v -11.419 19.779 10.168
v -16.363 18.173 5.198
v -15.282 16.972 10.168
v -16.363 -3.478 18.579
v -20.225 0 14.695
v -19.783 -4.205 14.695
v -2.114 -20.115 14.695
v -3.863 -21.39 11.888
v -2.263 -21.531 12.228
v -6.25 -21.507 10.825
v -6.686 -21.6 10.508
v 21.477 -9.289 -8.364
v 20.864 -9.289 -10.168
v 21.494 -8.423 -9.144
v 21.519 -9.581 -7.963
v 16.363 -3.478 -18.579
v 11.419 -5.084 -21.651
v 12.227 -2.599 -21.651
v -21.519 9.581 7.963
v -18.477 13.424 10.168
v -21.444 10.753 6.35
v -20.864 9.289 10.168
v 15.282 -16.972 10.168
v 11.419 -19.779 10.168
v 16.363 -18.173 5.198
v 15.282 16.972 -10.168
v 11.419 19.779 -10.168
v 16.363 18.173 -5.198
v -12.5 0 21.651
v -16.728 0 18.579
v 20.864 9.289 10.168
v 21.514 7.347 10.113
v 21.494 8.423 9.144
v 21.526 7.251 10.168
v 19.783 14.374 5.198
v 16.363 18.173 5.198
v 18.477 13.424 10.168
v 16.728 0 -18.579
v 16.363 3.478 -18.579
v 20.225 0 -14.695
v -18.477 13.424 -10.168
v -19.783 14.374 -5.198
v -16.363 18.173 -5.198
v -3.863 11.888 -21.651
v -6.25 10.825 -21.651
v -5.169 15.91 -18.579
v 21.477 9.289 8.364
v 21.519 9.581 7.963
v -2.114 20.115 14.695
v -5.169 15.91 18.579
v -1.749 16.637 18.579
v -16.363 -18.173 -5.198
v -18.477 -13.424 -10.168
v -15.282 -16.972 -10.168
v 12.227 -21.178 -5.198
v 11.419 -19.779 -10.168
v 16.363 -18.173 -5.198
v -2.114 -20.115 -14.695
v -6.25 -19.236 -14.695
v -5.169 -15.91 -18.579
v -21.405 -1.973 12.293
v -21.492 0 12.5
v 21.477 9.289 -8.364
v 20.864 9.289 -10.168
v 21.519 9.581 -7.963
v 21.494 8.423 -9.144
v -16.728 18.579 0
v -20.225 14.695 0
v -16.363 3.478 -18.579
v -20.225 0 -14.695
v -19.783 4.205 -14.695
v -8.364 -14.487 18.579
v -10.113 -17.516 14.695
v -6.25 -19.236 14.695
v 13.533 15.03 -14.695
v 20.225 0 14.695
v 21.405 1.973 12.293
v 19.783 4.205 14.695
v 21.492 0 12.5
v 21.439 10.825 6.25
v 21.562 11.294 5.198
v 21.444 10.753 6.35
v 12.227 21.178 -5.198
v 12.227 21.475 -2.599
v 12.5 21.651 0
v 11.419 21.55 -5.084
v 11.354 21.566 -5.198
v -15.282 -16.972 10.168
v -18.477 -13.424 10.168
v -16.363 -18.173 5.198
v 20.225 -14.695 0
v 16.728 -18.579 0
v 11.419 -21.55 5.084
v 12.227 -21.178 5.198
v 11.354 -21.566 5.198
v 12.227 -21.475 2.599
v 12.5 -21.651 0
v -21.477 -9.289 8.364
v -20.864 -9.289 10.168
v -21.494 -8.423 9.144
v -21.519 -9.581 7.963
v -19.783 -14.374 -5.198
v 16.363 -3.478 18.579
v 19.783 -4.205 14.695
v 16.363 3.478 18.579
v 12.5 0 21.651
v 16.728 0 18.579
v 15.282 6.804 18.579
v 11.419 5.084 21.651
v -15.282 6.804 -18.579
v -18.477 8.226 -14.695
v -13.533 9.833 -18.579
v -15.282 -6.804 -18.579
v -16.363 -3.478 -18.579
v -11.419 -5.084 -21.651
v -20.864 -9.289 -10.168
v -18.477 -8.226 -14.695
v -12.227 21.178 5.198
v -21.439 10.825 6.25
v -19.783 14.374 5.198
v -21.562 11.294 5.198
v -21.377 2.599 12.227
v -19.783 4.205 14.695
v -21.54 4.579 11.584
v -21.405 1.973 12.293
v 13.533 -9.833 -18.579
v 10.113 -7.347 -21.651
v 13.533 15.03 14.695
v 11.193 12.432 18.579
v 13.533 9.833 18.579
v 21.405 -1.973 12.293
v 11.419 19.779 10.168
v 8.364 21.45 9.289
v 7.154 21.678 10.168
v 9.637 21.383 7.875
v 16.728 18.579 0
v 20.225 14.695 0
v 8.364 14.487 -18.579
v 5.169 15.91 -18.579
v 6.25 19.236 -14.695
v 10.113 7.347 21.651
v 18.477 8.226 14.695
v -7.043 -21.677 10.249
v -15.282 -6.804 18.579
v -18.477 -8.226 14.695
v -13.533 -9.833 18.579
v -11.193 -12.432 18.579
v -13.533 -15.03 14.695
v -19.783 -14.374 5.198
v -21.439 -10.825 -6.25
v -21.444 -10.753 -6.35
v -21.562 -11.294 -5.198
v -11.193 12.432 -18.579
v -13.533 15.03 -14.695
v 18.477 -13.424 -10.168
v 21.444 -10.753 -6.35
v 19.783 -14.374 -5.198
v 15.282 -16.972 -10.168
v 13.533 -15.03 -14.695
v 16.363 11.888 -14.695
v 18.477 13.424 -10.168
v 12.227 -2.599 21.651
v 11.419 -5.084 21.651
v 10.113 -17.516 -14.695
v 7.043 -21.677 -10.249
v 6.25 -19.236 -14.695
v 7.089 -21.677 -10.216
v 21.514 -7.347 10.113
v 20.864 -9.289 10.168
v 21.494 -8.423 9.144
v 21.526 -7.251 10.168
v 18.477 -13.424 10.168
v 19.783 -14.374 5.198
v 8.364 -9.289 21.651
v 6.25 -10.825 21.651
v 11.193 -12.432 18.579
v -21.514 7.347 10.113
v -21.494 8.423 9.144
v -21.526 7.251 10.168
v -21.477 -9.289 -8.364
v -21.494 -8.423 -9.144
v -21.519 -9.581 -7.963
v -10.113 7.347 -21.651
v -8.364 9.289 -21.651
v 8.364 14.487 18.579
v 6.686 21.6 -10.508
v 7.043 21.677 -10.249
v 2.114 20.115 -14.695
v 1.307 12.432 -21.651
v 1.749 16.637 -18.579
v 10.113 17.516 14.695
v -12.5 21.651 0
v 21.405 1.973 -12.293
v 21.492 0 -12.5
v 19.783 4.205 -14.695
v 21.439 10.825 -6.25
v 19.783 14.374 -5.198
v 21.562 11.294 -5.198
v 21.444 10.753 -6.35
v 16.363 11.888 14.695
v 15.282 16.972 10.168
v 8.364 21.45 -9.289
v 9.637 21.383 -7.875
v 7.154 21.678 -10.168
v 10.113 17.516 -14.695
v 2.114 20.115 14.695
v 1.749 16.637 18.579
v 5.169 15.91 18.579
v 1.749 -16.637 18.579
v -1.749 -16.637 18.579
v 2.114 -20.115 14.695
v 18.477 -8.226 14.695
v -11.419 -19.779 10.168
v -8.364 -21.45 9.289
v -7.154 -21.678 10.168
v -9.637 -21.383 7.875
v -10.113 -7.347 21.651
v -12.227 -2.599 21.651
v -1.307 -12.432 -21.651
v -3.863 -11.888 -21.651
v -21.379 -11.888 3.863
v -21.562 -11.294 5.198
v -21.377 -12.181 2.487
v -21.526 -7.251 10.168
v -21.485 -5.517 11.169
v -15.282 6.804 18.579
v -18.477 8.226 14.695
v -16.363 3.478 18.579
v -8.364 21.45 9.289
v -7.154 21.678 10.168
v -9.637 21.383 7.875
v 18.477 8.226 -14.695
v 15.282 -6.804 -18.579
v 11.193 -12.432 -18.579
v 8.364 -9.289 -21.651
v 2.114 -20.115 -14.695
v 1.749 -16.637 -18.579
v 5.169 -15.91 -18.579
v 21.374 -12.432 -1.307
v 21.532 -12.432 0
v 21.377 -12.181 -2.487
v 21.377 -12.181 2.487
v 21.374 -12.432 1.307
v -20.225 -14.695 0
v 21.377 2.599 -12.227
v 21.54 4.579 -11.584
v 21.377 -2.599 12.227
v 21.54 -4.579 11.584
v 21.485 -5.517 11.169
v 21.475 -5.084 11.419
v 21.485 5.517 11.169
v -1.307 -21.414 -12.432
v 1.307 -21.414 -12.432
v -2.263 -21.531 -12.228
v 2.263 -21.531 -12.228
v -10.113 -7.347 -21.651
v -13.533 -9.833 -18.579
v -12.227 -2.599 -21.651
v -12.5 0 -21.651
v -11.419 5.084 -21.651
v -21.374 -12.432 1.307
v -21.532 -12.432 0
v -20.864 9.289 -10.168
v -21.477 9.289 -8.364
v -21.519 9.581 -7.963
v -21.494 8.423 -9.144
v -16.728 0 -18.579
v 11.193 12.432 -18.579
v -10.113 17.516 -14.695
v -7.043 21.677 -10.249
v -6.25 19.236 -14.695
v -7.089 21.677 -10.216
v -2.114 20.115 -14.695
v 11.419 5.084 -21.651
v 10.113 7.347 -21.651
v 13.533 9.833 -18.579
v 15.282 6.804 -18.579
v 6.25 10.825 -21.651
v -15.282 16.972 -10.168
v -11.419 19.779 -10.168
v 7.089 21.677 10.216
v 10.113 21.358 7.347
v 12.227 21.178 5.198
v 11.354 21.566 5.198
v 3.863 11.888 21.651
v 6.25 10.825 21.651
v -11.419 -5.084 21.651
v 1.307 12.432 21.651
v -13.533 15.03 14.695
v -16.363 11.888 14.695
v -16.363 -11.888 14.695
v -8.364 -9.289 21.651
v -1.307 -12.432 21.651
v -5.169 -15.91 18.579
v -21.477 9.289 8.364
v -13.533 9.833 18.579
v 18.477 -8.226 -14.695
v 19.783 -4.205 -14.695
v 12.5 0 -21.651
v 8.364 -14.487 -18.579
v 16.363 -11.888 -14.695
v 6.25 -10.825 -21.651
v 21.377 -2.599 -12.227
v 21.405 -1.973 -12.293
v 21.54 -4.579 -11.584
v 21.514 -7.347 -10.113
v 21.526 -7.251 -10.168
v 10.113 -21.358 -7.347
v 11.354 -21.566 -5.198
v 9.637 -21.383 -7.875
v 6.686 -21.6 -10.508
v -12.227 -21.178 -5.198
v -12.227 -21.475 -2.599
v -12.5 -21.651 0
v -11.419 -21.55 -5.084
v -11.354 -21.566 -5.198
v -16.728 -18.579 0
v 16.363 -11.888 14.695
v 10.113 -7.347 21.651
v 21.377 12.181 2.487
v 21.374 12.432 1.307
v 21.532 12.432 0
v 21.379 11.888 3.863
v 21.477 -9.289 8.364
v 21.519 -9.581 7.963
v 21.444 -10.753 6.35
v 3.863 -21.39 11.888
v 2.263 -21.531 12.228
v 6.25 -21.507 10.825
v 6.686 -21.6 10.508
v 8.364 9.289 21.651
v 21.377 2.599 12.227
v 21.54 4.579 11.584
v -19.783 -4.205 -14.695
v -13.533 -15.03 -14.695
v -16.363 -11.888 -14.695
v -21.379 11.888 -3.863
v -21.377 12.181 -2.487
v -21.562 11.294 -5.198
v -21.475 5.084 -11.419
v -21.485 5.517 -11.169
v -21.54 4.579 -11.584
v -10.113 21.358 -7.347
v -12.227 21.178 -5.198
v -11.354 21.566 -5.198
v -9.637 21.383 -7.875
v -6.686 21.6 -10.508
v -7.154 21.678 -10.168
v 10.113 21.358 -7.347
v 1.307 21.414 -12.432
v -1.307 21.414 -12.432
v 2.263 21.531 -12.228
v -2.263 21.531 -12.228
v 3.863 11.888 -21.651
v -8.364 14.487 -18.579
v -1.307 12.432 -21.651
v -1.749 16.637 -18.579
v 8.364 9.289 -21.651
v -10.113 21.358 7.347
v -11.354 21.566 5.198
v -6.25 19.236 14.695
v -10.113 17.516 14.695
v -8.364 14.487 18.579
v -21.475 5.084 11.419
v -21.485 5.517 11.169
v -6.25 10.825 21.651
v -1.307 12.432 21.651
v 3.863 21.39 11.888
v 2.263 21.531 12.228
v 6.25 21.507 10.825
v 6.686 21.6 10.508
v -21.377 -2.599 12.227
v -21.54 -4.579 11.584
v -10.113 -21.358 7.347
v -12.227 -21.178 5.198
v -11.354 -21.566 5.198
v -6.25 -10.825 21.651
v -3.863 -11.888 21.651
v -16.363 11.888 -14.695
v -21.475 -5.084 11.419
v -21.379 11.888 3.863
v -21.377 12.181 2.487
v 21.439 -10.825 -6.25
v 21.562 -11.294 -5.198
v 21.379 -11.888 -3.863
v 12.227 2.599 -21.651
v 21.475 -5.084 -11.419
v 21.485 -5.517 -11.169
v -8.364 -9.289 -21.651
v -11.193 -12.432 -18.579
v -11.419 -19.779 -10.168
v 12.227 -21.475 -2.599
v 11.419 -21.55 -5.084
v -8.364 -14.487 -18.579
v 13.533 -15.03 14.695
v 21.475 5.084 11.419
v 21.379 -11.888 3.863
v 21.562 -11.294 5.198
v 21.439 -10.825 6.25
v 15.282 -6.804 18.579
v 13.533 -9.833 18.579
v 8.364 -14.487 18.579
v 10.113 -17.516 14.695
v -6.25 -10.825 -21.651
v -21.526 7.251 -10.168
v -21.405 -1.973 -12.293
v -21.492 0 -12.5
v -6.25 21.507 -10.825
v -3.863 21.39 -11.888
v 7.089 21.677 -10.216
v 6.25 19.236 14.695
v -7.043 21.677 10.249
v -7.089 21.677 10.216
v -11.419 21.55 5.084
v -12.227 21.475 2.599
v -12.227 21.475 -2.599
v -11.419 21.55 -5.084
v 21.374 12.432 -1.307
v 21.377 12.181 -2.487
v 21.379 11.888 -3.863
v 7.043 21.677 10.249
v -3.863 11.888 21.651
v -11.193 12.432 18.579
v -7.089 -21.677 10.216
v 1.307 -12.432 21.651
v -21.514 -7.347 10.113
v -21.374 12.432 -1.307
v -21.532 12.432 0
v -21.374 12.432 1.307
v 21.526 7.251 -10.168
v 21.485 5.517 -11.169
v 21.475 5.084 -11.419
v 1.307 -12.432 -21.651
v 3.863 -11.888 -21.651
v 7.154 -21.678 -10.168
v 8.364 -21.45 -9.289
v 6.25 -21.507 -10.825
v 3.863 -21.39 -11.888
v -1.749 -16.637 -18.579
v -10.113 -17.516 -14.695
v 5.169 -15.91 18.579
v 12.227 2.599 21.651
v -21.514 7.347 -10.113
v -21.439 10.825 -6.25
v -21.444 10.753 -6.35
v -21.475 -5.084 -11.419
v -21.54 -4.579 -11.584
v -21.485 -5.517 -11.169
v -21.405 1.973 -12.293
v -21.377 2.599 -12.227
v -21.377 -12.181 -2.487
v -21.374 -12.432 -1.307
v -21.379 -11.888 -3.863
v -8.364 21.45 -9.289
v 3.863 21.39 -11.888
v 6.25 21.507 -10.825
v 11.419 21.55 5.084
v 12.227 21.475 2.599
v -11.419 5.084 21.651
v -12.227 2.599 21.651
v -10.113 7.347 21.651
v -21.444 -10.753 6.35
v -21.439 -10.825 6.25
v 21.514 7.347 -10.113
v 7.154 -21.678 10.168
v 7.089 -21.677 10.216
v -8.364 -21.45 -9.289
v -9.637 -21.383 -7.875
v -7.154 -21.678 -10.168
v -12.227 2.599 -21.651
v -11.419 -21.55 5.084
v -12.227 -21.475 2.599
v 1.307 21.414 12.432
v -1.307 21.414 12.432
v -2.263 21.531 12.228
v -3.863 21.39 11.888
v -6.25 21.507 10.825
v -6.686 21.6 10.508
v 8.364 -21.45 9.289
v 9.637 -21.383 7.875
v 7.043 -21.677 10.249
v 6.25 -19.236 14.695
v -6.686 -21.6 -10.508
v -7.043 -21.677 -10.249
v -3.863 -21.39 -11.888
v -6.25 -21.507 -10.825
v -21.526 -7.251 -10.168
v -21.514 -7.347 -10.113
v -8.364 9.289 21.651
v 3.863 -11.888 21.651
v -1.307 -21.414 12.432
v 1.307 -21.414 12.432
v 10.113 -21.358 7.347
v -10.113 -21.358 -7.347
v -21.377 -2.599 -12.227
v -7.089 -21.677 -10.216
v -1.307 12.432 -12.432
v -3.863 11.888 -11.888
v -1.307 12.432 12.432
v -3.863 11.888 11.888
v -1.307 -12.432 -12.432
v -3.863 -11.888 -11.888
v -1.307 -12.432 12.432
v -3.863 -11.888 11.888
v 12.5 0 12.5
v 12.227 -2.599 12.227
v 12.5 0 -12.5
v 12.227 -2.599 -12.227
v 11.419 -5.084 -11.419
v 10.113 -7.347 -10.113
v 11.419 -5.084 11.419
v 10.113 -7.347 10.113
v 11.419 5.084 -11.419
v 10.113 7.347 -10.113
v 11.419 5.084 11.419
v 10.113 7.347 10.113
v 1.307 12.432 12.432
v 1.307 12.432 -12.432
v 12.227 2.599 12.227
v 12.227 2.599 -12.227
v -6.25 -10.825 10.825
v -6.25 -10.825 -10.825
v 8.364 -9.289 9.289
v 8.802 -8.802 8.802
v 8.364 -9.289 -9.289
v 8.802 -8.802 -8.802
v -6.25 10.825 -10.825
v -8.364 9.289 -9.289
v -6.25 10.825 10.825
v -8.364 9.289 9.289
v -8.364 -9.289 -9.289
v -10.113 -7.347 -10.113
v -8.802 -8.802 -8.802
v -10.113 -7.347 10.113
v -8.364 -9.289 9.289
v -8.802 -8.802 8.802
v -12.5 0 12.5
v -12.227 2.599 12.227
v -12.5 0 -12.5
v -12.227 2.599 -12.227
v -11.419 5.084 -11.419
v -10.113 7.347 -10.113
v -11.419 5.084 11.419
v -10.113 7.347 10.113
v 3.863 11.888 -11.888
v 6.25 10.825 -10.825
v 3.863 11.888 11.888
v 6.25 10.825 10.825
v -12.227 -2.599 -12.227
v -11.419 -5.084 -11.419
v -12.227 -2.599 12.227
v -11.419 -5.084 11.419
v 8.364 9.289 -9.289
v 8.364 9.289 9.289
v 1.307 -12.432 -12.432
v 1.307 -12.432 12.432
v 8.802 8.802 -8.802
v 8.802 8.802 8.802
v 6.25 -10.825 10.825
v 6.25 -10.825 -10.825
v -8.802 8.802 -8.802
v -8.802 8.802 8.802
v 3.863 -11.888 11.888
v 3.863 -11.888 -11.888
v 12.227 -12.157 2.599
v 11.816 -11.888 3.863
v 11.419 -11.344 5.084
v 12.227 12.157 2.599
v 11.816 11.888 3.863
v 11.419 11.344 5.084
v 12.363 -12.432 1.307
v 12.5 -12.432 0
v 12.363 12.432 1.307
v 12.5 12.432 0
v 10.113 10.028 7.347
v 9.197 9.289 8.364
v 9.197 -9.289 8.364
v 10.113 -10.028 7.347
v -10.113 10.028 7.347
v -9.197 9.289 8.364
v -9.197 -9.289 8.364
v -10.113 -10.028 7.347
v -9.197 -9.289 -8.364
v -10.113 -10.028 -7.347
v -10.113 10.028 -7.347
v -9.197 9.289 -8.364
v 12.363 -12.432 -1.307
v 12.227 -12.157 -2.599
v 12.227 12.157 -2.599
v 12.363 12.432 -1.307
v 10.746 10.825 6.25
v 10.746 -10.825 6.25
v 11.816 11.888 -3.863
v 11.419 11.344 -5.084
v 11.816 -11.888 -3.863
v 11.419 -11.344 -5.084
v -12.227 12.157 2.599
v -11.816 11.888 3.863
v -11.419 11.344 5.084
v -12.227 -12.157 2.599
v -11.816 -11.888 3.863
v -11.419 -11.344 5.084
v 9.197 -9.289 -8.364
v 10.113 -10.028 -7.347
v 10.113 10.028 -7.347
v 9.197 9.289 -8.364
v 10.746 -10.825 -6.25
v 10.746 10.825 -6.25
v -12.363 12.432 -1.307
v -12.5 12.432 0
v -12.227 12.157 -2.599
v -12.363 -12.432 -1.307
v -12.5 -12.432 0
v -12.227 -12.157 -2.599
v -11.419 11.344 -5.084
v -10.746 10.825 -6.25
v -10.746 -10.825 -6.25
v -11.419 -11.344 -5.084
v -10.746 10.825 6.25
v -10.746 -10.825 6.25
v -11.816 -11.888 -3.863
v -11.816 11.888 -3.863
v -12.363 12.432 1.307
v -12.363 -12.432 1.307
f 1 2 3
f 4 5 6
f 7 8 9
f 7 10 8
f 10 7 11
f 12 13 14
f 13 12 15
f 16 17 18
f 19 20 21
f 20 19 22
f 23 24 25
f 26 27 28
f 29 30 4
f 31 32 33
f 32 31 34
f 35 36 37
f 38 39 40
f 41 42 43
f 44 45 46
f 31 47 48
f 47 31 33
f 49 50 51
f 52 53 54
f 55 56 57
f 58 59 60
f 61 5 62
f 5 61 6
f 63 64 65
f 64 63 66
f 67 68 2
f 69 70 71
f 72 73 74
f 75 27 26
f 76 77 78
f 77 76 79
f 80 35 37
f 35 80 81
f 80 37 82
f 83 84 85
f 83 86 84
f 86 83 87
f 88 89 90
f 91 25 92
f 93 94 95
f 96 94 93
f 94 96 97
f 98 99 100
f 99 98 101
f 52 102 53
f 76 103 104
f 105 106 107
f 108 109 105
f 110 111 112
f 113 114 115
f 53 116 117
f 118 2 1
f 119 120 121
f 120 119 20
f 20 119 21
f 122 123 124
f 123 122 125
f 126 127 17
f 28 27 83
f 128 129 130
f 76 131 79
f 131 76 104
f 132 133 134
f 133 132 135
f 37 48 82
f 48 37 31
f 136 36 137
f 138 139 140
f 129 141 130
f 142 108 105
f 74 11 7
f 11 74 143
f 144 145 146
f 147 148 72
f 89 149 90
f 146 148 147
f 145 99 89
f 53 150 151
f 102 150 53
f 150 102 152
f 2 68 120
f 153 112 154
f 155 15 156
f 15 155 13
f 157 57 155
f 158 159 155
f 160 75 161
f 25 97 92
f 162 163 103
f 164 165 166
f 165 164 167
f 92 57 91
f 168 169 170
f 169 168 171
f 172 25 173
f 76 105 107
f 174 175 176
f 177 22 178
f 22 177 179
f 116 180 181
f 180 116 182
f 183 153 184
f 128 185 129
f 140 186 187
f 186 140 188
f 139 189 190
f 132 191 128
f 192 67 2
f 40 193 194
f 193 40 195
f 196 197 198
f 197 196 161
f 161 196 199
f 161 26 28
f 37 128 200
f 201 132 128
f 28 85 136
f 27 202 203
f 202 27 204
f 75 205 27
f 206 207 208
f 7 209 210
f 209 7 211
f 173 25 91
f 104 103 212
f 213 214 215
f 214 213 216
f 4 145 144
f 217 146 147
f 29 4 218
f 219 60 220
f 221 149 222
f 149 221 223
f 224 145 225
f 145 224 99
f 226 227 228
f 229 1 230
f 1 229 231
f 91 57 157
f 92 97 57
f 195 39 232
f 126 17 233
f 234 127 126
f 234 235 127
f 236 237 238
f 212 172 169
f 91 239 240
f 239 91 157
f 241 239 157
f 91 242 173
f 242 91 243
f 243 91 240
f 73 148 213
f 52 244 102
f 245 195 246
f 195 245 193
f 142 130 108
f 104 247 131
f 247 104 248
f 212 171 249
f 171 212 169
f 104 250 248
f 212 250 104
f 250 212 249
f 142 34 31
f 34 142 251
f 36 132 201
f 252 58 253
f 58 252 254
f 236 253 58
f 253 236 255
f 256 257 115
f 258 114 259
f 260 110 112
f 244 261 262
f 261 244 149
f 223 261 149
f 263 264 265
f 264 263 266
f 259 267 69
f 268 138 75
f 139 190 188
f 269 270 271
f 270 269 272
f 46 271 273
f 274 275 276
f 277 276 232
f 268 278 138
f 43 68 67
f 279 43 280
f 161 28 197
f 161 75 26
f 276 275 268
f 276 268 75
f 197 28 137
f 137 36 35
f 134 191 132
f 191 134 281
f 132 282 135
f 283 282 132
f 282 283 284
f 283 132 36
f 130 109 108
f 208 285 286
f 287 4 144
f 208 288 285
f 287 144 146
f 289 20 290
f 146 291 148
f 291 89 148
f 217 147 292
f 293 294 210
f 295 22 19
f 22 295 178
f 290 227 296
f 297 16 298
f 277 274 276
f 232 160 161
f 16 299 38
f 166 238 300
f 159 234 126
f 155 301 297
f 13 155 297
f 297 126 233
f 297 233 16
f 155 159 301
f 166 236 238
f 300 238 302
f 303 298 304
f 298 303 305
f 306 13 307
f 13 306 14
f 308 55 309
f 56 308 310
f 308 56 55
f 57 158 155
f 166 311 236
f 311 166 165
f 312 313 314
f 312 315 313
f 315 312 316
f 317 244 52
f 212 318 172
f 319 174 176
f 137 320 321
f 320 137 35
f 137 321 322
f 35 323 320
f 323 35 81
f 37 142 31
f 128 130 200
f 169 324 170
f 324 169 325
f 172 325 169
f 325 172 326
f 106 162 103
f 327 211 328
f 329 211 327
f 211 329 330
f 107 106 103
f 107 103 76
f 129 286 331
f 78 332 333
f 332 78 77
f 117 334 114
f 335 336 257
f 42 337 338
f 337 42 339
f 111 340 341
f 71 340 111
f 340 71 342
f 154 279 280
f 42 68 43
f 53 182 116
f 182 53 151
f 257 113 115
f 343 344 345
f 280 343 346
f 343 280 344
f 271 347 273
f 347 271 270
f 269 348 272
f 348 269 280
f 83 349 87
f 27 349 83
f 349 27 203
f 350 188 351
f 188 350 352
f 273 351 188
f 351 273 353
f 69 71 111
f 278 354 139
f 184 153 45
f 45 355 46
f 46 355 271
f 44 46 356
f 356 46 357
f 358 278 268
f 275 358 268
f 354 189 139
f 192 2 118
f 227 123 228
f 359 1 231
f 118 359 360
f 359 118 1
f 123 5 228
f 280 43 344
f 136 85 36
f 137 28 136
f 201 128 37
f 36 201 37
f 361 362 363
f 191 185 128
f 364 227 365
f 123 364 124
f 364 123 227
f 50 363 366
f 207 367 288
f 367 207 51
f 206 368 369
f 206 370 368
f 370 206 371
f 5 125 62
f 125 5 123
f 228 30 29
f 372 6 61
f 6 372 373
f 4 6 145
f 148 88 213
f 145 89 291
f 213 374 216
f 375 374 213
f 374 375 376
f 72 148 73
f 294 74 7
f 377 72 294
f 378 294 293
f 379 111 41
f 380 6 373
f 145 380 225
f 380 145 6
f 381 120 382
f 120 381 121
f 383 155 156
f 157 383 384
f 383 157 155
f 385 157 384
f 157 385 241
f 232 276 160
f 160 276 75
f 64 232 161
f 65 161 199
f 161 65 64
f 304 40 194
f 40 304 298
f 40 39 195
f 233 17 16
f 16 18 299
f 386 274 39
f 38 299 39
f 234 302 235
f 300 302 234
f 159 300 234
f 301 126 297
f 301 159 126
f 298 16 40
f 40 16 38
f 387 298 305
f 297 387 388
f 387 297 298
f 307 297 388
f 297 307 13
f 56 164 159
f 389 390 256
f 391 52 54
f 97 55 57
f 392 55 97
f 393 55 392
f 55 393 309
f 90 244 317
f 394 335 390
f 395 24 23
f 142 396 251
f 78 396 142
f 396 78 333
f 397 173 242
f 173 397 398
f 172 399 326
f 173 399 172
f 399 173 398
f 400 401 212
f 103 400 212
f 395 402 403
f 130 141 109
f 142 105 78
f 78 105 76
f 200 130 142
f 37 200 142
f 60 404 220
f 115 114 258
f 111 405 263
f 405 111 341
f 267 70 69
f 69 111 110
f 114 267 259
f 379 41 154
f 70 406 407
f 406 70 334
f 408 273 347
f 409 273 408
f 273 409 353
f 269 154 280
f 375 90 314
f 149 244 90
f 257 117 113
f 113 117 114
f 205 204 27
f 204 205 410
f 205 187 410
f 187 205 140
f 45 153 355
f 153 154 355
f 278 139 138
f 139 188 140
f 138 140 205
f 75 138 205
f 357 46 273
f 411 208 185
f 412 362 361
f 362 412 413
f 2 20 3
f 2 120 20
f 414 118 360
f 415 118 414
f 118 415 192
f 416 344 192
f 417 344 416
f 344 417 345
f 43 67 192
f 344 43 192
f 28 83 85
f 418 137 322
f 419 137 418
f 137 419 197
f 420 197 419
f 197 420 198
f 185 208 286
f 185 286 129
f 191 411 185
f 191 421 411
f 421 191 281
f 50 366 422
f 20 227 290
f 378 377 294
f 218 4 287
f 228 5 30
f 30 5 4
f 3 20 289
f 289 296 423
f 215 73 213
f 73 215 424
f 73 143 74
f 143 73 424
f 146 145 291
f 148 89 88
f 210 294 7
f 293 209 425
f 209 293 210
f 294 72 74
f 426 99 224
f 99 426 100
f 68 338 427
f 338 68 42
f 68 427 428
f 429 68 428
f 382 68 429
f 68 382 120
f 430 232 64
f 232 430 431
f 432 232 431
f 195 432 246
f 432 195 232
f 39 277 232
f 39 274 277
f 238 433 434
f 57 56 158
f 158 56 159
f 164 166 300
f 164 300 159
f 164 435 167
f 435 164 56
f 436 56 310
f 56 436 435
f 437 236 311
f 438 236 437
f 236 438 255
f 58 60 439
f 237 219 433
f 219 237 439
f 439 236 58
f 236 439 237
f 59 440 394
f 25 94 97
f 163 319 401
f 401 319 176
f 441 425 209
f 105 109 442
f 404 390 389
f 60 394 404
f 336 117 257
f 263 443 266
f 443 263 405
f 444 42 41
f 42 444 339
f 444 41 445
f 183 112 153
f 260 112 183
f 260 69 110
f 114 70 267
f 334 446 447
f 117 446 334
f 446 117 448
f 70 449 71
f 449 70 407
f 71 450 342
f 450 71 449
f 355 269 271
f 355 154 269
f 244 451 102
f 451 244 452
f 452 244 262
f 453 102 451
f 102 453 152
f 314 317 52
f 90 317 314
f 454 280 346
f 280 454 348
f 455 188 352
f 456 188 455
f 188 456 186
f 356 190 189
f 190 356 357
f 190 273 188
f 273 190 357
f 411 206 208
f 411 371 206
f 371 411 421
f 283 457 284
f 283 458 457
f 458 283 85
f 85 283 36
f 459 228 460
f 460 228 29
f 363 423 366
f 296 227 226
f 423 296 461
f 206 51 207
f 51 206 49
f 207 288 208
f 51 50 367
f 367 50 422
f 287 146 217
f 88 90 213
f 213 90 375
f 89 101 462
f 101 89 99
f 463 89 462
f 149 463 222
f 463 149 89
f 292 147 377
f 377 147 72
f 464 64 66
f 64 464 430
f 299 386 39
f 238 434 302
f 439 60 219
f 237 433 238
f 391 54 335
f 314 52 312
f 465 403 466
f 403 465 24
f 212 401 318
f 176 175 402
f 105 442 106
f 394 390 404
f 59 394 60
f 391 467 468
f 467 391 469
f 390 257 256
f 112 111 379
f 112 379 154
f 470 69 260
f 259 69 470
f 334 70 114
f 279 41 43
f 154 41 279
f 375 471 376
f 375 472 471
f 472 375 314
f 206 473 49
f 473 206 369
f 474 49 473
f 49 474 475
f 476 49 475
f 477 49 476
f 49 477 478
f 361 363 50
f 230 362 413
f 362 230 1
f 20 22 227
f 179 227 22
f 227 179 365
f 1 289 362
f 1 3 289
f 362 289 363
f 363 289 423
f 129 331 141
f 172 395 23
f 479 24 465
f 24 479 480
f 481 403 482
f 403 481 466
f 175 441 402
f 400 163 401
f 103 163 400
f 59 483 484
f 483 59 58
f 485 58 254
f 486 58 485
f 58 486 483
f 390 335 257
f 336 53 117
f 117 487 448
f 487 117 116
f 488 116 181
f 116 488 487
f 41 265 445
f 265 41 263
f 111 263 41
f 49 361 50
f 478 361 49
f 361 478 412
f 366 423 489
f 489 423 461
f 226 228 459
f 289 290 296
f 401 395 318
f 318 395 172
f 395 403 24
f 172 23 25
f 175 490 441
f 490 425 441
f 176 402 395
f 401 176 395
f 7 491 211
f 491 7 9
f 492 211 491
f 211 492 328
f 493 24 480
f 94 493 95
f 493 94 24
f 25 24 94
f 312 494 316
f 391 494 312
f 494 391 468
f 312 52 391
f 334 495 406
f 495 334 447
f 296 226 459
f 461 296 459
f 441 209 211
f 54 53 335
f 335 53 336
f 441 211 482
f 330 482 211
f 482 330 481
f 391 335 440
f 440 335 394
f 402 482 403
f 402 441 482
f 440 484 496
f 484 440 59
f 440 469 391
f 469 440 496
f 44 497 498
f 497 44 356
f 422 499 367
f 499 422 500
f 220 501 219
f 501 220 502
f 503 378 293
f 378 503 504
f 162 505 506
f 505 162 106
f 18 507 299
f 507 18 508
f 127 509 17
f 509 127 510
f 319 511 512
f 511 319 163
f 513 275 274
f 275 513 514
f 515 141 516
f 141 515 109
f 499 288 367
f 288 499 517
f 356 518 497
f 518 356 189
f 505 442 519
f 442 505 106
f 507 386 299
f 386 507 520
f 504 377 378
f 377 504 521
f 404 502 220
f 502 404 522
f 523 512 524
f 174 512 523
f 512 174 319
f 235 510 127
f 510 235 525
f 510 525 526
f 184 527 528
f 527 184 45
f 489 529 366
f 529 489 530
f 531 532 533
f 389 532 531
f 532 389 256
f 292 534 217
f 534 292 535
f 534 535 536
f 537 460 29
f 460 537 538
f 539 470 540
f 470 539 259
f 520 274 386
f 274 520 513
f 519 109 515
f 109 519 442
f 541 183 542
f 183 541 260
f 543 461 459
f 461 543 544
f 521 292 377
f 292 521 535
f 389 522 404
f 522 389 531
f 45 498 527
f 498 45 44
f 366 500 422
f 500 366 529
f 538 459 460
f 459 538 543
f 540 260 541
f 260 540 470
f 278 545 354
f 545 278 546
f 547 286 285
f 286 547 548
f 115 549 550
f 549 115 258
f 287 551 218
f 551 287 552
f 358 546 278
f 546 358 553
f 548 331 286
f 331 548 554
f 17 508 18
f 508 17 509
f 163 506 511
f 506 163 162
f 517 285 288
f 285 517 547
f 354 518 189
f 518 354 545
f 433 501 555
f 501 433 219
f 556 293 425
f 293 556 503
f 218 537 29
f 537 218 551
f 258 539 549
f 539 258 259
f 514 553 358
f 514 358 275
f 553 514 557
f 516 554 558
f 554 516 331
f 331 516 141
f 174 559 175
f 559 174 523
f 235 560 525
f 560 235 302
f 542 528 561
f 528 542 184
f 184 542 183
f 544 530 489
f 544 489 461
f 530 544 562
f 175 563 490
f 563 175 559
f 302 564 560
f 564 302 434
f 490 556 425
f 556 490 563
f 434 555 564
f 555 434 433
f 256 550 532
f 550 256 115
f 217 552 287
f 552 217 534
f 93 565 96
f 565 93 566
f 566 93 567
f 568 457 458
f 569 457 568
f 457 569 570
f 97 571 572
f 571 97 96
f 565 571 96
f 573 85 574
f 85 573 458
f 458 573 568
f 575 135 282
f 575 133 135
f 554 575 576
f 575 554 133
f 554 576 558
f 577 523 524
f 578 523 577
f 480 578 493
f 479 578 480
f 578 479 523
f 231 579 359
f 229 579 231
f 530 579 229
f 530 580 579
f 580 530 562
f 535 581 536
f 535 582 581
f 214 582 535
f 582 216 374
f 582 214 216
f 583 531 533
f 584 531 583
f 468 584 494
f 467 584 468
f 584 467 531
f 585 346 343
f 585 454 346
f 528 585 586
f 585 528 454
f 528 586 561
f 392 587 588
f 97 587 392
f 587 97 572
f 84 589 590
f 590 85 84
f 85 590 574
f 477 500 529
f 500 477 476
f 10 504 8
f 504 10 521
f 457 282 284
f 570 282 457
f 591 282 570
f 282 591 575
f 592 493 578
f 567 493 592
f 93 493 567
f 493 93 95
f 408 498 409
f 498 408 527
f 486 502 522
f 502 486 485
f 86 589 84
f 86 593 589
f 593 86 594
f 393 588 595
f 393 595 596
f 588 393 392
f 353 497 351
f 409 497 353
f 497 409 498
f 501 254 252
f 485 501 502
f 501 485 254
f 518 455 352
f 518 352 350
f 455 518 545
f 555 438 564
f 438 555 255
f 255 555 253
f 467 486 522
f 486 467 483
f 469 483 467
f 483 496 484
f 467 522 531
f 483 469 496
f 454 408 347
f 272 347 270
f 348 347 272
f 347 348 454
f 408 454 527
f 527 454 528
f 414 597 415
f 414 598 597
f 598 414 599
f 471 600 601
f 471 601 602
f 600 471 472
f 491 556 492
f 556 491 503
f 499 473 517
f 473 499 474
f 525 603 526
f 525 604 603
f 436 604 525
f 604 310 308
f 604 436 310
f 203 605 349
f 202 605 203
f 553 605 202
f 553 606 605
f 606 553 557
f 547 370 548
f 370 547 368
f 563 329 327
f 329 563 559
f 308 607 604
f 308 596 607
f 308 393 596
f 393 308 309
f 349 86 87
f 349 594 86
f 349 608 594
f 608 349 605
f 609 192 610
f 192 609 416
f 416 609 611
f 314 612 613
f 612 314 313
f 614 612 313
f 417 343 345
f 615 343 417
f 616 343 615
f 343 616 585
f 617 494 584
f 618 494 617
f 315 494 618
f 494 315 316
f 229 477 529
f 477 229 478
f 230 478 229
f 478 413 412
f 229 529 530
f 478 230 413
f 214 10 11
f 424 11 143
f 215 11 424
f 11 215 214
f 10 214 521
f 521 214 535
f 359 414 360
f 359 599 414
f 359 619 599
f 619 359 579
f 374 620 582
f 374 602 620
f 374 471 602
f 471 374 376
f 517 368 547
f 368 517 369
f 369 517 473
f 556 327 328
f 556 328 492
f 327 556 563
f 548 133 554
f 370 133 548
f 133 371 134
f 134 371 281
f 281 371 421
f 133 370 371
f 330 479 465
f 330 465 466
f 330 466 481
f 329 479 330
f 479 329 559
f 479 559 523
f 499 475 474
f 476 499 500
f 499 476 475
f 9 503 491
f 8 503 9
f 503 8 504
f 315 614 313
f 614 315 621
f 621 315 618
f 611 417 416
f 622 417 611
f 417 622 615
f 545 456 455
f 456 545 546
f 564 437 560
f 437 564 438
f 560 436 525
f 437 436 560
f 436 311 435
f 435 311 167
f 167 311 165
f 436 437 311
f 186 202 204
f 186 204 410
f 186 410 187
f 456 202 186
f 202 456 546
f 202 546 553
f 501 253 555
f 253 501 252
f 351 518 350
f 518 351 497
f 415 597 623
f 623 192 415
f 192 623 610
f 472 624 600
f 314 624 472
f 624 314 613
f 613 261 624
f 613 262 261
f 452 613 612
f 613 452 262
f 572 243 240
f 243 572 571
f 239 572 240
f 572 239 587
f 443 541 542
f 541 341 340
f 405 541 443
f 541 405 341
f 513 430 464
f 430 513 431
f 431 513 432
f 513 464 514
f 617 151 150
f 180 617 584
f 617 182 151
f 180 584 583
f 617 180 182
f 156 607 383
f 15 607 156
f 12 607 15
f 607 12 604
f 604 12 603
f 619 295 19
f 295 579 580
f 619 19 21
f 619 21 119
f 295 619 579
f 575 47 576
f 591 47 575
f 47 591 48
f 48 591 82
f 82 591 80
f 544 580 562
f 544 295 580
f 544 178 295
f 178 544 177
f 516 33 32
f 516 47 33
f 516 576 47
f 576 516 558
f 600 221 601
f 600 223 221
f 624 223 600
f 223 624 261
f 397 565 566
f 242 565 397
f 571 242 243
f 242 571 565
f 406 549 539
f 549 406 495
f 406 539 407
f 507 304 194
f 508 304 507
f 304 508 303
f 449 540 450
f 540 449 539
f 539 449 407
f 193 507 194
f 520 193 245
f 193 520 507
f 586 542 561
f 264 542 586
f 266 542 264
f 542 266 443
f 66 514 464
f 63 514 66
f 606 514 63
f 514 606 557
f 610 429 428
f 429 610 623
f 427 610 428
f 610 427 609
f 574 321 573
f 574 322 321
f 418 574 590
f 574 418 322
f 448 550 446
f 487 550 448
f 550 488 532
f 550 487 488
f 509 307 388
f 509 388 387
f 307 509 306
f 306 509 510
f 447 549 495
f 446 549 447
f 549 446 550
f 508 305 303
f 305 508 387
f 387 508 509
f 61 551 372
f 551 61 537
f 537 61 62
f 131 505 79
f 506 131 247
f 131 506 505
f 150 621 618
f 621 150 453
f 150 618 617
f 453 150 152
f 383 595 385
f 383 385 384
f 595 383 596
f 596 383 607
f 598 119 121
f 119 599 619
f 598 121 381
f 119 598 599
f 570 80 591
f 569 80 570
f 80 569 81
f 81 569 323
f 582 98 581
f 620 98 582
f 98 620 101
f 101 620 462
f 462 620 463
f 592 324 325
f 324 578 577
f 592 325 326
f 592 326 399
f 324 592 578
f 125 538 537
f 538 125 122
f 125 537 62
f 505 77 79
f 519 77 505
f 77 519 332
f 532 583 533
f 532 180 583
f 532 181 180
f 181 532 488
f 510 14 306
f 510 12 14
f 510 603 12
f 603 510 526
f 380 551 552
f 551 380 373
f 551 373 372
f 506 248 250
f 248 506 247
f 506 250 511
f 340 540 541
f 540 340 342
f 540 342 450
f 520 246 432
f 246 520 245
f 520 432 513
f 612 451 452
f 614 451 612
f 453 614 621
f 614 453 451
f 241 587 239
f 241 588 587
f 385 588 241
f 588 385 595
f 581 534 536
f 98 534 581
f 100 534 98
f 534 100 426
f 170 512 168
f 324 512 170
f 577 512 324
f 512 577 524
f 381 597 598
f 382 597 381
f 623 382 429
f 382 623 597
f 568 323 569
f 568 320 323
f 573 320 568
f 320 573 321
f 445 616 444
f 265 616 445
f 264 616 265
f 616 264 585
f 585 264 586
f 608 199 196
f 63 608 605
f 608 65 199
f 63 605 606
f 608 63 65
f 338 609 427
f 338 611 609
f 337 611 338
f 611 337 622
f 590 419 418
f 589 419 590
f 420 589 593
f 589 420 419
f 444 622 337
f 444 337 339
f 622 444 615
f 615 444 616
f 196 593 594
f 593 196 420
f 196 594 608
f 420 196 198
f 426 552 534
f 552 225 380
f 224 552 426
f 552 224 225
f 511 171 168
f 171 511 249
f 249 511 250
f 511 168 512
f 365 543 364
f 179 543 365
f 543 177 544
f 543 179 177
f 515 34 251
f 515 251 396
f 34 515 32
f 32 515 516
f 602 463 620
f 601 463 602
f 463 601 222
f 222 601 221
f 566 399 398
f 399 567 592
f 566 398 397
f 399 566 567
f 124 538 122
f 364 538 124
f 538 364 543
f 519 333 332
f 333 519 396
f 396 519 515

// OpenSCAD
// logo.scad - Basic example of module, top-level variable and $fn usage

// The $fn parameter will influence all objects inside this module
// It can, optionally, be overridden when instantiating the module
module Logo(size=50, fn=100) {
    // Temporary variables
    hole = size/2;
    cylinderHeight = size * 1.25;

    // One positive object (sphere) and three negative objects (cylinders)
    difference() {
        sphere(r=size/2);

        cylinder(r1=hole / 2, r2=hole/2, h=cylinderHeight, center=true);
        // The '#' operator highlights the object
        rotate(a = [90, 0, 0]) cylinder(r1=hole / 2, r2=hole/2, h=cylinderHeight, center=true);
        rotate(a = [0, 90, 0]) cylinder(r1=hole / 2, r2=hole/2, h=cylinderHeight, center=true);
    }
}

Logo(50);
